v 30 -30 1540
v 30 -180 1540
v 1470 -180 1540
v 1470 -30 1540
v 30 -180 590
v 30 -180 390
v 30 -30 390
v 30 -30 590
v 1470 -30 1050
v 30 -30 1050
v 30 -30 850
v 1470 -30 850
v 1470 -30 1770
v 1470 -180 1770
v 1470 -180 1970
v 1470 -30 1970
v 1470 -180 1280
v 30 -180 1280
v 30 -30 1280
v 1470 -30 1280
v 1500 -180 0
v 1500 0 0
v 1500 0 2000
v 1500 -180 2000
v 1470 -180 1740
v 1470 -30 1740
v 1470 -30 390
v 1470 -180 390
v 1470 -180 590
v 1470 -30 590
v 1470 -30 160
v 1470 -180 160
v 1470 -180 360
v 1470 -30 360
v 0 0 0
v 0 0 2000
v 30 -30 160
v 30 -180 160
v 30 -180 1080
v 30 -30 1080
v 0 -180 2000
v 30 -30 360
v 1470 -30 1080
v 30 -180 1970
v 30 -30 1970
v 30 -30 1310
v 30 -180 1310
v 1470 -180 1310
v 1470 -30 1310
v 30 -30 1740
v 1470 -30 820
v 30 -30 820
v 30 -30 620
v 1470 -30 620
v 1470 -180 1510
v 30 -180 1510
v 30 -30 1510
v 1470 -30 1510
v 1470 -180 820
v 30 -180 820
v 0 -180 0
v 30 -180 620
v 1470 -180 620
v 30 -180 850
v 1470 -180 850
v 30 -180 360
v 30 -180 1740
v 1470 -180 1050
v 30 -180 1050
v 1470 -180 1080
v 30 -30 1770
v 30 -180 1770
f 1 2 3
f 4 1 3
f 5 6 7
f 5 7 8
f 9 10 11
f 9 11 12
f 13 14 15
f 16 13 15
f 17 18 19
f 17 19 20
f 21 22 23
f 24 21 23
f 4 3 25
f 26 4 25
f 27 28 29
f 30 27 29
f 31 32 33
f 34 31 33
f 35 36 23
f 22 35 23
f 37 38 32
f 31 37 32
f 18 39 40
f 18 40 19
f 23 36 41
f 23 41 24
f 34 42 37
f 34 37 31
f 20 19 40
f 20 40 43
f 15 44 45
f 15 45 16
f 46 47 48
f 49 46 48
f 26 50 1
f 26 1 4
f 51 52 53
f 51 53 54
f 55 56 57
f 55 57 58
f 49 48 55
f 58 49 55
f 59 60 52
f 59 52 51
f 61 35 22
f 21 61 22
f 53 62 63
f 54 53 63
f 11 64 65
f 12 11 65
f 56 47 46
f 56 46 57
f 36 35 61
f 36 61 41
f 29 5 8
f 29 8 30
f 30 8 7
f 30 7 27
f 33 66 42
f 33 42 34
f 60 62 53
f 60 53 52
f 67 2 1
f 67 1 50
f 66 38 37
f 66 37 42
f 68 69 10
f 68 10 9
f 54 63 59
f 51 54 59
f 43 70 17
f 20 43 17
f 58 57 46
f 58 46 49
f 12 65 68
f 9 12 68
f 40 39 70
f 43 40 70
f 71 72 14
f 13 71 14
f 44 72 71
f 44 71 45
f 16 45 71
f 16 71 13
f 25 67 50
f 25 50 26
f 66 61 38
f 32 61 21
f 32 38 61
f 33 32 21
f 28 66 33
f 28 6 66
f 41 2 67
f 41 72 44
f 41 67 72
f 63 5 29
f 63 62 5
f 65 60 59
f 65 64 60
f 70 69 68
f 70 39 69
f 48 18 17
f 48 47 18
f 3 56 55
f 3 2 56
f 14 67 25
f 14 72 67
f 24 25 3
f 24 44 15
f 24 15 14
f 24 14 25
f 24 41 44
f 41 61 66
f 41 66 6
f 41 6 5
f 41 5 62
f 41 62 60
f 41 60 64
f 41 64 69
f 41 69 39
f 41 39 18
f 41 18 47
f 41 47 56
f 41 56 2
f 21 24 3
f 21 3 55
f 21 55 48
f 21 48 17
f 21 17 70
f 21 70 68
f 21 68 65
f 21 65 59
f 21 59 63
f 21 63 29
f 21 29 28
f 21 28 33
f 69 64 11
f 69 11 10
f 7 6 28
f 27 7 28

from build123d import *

# Parameters (mm, degrees)
F0_W     = 1500
F0_H     = 2000
F1_DEPTH = 180
F2_W     = 1440
F2_H     = 200
F3_DEPTH = 150


with BuildPart() as f1:
    # F0 (on Front) → F1 (new body)
    with BuildSketch(Plane.XZ):
        with Locations((750, 1000)):
            Rectangle(F0_W, F0_H)
    extrude(amount=F1_DEPTH)

    # F2 (on face) → F3 (cut)
    with BuildSketch(Plane.XZ.offset(180)):
        with Locations((750, 1870)):
            Rectangle(F2_W, F2_H)
        with Locations((750, 1640)):
            Rectangle(F2_W, F2_H)
        with Locations((750, 1410)):
            Rectangle(F2_W, F2_H)
        with Locations((750, 1180)):
            Rectangle(F2_W, F2_H)
        with Locations((750, 950)):
            Rectangle(F2_W, F2_H)
        with Locations((750, 720)):
            Rectangle(F2_W, F2_H)
        with Locations((750, 490)):
            Rectangle(F2_W, F2_H)
        with Locations((750, 260)):
            Rectangle(F2_W, F2_H)
    extrude(amount=-F3_DEPTH, mode=Mode.SUBTRACT)


solid = f1.part
